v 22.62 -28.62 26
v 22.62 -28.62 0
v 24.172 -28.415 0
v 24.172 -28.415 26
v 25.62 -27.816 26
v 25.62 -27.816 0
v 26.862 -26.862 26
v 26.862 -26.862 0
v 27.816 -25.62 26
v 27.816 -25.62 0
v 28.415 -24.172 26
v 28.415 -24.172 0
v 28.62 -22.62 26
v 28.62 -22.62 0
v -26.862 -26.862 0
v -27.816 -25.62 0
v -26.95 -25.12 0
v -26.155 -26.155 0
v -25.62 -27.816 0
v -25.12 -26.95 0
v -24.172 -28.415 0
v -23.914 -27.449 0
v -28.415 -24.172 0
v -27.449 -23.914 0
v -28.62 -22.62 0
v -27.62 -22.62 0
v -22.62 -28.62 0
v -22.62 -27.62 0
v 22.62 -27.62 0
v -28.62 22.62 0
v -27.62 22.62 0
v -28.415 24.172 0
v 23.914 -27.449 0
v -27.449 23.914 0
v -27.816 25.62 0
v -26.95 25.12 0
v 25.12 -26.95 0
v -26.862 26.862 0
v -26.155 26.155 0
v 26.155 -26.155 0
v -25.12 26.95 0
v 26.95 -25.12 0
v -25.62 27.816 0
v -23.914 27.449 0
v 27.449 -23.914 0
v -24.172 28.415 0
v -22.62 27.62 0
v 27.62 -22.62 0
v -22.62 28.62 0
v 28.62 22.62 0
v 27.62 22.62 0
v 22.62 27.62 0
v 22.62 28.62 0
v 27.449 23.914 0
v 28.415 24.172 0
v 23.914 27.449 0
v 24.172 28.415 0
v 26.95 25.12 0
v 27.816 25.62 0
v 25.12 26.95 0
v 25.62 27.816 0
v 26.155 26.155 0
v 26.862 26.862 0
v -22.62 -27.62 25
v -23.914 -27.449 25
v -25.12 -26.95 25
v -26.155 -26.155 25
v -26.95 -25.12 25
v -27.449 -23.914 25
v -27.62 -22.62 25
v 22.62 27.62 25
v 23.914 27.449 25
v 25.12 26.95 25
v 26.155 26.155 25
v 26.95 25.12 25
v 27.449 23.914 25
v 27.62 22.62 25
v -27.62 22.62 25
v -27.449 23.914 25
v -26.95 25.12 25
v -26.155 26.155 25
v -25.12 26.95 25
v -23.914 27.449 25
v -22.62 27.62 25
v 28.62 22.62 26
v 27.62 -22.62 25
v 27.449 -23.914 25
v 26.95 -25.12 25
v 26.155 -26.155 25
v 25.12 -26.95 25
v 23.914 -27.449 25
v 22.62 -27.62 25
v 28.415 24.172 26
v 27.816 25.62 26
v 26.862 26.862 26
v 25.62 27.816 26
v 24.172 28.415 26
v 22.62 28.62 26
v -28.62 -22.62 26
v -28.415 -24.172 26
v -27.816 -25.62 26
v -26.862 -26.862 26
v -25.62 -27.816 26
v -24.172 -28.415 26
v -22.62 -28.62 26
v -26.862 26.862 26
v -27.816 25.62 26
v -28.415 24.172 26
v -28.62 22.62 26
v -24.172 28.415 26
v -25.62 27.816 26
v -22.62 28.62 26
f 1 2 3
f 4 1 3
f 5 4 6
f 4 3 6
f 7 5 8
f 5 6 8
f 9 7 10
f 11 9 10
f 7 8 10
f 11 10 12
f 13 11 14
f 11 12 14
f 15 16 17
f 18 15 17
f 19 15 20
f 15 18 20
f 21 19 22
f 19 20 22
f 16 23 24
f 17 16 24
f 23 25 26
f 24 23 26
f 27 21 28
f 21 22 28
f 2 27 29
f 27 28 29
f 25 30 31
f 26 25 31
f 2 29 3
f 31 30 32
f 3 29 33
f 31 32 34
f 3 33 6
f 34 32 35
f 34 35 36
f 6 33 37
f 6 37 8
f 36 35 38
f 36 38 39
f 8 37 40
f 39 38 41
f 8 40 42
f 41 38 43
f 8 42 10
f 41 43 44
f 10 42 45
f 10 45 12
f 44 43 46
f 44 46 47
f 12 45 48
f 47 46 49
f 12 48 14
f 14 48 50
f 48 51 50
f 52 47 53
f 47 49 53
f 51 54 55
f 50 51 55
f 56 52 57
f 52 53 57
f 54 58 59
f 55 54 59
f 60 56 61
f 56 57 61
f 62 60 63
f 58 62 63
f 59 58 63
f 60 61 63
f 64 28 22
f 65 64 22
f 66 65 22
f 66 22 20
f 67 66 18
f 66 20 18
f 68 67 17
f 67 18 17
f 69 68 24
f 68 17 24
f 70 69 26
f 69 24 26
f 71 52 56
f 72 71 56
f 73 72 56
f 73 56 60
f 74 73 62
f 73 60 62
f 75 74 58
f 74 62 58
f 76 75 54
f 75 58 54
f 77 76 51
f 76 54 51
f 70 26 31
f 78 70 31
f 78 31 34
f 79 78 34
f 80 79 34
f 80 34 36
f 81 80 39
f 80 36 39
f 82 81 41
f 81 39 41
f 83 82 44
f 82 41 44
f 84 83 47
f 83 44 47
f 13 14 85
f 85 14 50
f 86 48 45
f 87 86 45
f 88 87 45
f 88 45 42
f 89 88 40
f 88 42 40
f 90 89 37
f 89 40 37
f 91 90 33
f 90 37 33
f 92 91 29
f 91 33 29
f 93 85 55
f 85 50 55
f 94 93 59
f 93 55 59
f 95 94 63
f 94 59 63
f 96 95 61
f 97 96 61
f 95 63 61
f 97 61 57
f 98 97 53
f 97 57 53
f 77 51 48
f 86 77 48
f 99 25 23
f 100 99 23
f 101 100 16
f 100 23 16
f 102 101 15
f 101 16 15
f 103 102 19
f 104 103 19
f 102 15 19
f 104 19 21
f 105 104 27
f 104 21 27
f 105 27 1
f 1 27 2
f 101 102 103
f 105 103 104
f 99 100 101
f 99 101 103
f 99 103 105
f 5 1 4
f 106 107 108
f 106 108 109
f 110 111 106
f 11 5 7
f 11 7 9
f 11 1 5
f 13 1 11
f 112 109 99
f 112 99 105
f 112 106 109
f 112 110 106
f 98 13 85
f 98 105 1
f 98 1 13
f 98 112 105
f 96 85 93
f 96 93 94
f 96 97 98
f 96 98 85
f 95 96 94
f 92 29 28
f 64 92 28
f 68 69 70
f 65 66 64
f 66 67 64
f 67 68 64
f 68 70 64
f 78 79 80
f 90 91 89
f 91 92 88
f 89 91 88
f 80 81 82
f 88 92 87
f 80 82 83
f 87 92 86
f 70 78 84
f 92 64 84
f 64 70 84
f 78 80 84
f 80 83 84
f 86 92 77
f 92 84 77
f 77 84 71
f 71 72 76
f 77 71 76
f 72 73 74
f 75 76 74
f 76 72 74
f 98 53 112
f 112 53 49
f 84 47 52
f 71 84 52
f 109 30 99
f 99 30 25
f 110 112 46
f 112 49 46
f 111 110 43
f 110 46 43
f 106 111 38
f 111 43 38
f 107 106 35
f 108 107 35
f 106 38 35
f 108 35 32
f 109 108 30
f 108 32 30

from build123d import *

# Parameters (mm, degrees)
F1_DEPTH = 25
F3_DEPTH = 1


with BuildPart() as f1:
    # F0 (on Top) → F1 (new body)
    with BuildSketch(Plane.XY):
        with BuildLine():
            Line((22.6195406914, 28.6195406914), (-22.6195406914, 28.6195406914))
            ThreePointArc((-22.6195406914, 28.6195406914), (-26.8621813785, 26.8621813785), (-28.6195406914, 22.6195406914))
            Line((-28.6195406914, 22.6195406914), (-28.6195406914, -22.6195406914))
            ThreePointArc((-28.6195406914, -22.6195406914), (-26.8621813785, -26.8621813785), (-22.6195406914, -28.6195406914))
            Line((-22.6195406914, -28.6195406914), (22.6195406914, -28.6195406914))
            ThreePointArc((22.6195406914, -28.6195406914), (26.8621813785, -26.8621813785), (28.6195406914, -22.6195406914))
            Line((28.6195406914, -22.6195406914), (28.6195406914, 22.6195406914))
            ThreePointArc((28.6195406914, 22.6195406914), (26.8621813785, 26.8621813785), (22.6195406914, 28.6195406914))
        make_face()
        with BuildLine():
            ThreePointArc((-27.6195406914, 22.6195406914), (-26.1550745973, 26.1550745973), (-22.6195406914, 27.6195406914))
            Line((-22.6195406914, 27.6195406914), (22.6195406914, 27.6195406914))
            ThreePointArc((22.6195406914, 27.6195406914), (26.1550745973, 26.1550745973), (27.6195406914, 22.6195406914))
            Line((27.6195406914, 22.6195406914), (27.6195406914, -22.6195406914))
            ThreePointArc((27.6195406914, -22.6195406914), (26.1550745973, -26.1550745973), (22.6195406914, -27.6195406914))
            Line((22.6195406914, -27.6195406914), (-22.6195406914, -27.6195406914))
            ThreePointArc((-22.6195406914, -27.6195406914), (-26.1550745973, -26.1550745973), (-27.6195406914, -22.6195406914))
            Line((-27.6195406914, -22.6195406914), (-27.6195406914, 22.6195406914))
        make_face(mode=Mode.SUBTRACT)
    extrude(amount=F1_DEPTH)

    # F2 (on face) → F3 (join)
    with BuildSketch(Plane.XY.offset(25)):
        with BuildLine():
            ThreePointArc((22.6195406914, -28.6195406914), (26.8621813785, -26.8621813785), (28.6195406914, -22.6195406914))
            Line((28.6195406914, -22.6195406914), (28.6195406914, 22.6195406914))
            ThreePointArc((28.6195406914, 22.6195406914), (26.8621813785, 26.8621813785), (22.6195406914, 28.6195406914))
            Line((22.6195406914, 28.6195406914), (-22.6195406914, 28.6195406914))
            ThreePointArc((-22.6195406914, 28.6195406914), (-26.8621813785, 26.8621813785), (-28.6195406914, 22.6195406914))
            Line((-28.6195406914, 22.6195406914), (-28.6195406914, -22.6195406914))
            ThreePointArc((-28.6195406914, -22.6195406914), (-26.8621813785, -26.8621813785), (-22.6195406914, -28.6195406914))
            Line((-22.6195406914, -28.6195406914), (22.6195406914, -28.6195406914))
        make_face()
        with BuildLine():
            Line((-27.6195406914, -22.6195406914), (-27.6195406914, 22.6195406914))
            ThreePointArc((-27.6195406914, 22.6195406914), (-26.1550745973, 26.1550745973), (-22.6195406914, 27.6195406914))
            Line((-22.6195406914, 27.6195406914), (22.6195406914, 27.6195406914))
            ThreePointArc((22.6195406914, 27.6195406914), (26.1550745973, 26.1550745973), (27.6195406914, 22.6195406914))
            Line((27.6195406914, 22.6195406914), (27.6195406914, -22.6195406914))
            ThreePointArc((27.6195406914, -22.6195406914), (26.1550745973, -26.1550745973), (22.6195406914, -27.6195406914))
            Line((22.6195406914, -27.6195406914), (-22.6195406914, -27.6195406914))
            ThreePointArc((-22.6195406914, -27.6195406914), (-26.1550745973, -26.1550745973), (-27.6195406914, -22.6195406914))
        make_face(mode=Mode.SUBTRACT)
        with BuildLine():
            ThreePointArc((-22.6195406914, 27.6195406914), (-26.1550745973, 26.1550745973), (-27.6195406914, 22.6195406914))
            Line((-27.6195406914, 22.6195406914), (-27.6195406914, -22.6195406914))
            ThreePointArc((-27.6195406914, -22.6195406914), (-26.1550745973, -26.1550745973), (-22.6195406914, -27.6195406914))
            Line((-22.6195406914, -27.6195406914), (22.6195406914, -27.6195406914))
            ThreePointArc((22.6195406914, -27.6195406914), (26.1550745973, -26.1550745973), (27.6195406914, -22.6195406914))
            Line((27.6195406914, -22.6195406914), (27.6195406914, 22.6195406914))
            ThreePointArc((27.6195406914, 22.6195406914), (26.1550745973, 26.1550745973), (22.6195406914, 27.6195406914))
            Line((22.6195406914, 27.6195406914), (-22.6195406914, 27.6195406914))
        make_face()
    extrude(amount=F3_DEPTH)


solid = f1.part
